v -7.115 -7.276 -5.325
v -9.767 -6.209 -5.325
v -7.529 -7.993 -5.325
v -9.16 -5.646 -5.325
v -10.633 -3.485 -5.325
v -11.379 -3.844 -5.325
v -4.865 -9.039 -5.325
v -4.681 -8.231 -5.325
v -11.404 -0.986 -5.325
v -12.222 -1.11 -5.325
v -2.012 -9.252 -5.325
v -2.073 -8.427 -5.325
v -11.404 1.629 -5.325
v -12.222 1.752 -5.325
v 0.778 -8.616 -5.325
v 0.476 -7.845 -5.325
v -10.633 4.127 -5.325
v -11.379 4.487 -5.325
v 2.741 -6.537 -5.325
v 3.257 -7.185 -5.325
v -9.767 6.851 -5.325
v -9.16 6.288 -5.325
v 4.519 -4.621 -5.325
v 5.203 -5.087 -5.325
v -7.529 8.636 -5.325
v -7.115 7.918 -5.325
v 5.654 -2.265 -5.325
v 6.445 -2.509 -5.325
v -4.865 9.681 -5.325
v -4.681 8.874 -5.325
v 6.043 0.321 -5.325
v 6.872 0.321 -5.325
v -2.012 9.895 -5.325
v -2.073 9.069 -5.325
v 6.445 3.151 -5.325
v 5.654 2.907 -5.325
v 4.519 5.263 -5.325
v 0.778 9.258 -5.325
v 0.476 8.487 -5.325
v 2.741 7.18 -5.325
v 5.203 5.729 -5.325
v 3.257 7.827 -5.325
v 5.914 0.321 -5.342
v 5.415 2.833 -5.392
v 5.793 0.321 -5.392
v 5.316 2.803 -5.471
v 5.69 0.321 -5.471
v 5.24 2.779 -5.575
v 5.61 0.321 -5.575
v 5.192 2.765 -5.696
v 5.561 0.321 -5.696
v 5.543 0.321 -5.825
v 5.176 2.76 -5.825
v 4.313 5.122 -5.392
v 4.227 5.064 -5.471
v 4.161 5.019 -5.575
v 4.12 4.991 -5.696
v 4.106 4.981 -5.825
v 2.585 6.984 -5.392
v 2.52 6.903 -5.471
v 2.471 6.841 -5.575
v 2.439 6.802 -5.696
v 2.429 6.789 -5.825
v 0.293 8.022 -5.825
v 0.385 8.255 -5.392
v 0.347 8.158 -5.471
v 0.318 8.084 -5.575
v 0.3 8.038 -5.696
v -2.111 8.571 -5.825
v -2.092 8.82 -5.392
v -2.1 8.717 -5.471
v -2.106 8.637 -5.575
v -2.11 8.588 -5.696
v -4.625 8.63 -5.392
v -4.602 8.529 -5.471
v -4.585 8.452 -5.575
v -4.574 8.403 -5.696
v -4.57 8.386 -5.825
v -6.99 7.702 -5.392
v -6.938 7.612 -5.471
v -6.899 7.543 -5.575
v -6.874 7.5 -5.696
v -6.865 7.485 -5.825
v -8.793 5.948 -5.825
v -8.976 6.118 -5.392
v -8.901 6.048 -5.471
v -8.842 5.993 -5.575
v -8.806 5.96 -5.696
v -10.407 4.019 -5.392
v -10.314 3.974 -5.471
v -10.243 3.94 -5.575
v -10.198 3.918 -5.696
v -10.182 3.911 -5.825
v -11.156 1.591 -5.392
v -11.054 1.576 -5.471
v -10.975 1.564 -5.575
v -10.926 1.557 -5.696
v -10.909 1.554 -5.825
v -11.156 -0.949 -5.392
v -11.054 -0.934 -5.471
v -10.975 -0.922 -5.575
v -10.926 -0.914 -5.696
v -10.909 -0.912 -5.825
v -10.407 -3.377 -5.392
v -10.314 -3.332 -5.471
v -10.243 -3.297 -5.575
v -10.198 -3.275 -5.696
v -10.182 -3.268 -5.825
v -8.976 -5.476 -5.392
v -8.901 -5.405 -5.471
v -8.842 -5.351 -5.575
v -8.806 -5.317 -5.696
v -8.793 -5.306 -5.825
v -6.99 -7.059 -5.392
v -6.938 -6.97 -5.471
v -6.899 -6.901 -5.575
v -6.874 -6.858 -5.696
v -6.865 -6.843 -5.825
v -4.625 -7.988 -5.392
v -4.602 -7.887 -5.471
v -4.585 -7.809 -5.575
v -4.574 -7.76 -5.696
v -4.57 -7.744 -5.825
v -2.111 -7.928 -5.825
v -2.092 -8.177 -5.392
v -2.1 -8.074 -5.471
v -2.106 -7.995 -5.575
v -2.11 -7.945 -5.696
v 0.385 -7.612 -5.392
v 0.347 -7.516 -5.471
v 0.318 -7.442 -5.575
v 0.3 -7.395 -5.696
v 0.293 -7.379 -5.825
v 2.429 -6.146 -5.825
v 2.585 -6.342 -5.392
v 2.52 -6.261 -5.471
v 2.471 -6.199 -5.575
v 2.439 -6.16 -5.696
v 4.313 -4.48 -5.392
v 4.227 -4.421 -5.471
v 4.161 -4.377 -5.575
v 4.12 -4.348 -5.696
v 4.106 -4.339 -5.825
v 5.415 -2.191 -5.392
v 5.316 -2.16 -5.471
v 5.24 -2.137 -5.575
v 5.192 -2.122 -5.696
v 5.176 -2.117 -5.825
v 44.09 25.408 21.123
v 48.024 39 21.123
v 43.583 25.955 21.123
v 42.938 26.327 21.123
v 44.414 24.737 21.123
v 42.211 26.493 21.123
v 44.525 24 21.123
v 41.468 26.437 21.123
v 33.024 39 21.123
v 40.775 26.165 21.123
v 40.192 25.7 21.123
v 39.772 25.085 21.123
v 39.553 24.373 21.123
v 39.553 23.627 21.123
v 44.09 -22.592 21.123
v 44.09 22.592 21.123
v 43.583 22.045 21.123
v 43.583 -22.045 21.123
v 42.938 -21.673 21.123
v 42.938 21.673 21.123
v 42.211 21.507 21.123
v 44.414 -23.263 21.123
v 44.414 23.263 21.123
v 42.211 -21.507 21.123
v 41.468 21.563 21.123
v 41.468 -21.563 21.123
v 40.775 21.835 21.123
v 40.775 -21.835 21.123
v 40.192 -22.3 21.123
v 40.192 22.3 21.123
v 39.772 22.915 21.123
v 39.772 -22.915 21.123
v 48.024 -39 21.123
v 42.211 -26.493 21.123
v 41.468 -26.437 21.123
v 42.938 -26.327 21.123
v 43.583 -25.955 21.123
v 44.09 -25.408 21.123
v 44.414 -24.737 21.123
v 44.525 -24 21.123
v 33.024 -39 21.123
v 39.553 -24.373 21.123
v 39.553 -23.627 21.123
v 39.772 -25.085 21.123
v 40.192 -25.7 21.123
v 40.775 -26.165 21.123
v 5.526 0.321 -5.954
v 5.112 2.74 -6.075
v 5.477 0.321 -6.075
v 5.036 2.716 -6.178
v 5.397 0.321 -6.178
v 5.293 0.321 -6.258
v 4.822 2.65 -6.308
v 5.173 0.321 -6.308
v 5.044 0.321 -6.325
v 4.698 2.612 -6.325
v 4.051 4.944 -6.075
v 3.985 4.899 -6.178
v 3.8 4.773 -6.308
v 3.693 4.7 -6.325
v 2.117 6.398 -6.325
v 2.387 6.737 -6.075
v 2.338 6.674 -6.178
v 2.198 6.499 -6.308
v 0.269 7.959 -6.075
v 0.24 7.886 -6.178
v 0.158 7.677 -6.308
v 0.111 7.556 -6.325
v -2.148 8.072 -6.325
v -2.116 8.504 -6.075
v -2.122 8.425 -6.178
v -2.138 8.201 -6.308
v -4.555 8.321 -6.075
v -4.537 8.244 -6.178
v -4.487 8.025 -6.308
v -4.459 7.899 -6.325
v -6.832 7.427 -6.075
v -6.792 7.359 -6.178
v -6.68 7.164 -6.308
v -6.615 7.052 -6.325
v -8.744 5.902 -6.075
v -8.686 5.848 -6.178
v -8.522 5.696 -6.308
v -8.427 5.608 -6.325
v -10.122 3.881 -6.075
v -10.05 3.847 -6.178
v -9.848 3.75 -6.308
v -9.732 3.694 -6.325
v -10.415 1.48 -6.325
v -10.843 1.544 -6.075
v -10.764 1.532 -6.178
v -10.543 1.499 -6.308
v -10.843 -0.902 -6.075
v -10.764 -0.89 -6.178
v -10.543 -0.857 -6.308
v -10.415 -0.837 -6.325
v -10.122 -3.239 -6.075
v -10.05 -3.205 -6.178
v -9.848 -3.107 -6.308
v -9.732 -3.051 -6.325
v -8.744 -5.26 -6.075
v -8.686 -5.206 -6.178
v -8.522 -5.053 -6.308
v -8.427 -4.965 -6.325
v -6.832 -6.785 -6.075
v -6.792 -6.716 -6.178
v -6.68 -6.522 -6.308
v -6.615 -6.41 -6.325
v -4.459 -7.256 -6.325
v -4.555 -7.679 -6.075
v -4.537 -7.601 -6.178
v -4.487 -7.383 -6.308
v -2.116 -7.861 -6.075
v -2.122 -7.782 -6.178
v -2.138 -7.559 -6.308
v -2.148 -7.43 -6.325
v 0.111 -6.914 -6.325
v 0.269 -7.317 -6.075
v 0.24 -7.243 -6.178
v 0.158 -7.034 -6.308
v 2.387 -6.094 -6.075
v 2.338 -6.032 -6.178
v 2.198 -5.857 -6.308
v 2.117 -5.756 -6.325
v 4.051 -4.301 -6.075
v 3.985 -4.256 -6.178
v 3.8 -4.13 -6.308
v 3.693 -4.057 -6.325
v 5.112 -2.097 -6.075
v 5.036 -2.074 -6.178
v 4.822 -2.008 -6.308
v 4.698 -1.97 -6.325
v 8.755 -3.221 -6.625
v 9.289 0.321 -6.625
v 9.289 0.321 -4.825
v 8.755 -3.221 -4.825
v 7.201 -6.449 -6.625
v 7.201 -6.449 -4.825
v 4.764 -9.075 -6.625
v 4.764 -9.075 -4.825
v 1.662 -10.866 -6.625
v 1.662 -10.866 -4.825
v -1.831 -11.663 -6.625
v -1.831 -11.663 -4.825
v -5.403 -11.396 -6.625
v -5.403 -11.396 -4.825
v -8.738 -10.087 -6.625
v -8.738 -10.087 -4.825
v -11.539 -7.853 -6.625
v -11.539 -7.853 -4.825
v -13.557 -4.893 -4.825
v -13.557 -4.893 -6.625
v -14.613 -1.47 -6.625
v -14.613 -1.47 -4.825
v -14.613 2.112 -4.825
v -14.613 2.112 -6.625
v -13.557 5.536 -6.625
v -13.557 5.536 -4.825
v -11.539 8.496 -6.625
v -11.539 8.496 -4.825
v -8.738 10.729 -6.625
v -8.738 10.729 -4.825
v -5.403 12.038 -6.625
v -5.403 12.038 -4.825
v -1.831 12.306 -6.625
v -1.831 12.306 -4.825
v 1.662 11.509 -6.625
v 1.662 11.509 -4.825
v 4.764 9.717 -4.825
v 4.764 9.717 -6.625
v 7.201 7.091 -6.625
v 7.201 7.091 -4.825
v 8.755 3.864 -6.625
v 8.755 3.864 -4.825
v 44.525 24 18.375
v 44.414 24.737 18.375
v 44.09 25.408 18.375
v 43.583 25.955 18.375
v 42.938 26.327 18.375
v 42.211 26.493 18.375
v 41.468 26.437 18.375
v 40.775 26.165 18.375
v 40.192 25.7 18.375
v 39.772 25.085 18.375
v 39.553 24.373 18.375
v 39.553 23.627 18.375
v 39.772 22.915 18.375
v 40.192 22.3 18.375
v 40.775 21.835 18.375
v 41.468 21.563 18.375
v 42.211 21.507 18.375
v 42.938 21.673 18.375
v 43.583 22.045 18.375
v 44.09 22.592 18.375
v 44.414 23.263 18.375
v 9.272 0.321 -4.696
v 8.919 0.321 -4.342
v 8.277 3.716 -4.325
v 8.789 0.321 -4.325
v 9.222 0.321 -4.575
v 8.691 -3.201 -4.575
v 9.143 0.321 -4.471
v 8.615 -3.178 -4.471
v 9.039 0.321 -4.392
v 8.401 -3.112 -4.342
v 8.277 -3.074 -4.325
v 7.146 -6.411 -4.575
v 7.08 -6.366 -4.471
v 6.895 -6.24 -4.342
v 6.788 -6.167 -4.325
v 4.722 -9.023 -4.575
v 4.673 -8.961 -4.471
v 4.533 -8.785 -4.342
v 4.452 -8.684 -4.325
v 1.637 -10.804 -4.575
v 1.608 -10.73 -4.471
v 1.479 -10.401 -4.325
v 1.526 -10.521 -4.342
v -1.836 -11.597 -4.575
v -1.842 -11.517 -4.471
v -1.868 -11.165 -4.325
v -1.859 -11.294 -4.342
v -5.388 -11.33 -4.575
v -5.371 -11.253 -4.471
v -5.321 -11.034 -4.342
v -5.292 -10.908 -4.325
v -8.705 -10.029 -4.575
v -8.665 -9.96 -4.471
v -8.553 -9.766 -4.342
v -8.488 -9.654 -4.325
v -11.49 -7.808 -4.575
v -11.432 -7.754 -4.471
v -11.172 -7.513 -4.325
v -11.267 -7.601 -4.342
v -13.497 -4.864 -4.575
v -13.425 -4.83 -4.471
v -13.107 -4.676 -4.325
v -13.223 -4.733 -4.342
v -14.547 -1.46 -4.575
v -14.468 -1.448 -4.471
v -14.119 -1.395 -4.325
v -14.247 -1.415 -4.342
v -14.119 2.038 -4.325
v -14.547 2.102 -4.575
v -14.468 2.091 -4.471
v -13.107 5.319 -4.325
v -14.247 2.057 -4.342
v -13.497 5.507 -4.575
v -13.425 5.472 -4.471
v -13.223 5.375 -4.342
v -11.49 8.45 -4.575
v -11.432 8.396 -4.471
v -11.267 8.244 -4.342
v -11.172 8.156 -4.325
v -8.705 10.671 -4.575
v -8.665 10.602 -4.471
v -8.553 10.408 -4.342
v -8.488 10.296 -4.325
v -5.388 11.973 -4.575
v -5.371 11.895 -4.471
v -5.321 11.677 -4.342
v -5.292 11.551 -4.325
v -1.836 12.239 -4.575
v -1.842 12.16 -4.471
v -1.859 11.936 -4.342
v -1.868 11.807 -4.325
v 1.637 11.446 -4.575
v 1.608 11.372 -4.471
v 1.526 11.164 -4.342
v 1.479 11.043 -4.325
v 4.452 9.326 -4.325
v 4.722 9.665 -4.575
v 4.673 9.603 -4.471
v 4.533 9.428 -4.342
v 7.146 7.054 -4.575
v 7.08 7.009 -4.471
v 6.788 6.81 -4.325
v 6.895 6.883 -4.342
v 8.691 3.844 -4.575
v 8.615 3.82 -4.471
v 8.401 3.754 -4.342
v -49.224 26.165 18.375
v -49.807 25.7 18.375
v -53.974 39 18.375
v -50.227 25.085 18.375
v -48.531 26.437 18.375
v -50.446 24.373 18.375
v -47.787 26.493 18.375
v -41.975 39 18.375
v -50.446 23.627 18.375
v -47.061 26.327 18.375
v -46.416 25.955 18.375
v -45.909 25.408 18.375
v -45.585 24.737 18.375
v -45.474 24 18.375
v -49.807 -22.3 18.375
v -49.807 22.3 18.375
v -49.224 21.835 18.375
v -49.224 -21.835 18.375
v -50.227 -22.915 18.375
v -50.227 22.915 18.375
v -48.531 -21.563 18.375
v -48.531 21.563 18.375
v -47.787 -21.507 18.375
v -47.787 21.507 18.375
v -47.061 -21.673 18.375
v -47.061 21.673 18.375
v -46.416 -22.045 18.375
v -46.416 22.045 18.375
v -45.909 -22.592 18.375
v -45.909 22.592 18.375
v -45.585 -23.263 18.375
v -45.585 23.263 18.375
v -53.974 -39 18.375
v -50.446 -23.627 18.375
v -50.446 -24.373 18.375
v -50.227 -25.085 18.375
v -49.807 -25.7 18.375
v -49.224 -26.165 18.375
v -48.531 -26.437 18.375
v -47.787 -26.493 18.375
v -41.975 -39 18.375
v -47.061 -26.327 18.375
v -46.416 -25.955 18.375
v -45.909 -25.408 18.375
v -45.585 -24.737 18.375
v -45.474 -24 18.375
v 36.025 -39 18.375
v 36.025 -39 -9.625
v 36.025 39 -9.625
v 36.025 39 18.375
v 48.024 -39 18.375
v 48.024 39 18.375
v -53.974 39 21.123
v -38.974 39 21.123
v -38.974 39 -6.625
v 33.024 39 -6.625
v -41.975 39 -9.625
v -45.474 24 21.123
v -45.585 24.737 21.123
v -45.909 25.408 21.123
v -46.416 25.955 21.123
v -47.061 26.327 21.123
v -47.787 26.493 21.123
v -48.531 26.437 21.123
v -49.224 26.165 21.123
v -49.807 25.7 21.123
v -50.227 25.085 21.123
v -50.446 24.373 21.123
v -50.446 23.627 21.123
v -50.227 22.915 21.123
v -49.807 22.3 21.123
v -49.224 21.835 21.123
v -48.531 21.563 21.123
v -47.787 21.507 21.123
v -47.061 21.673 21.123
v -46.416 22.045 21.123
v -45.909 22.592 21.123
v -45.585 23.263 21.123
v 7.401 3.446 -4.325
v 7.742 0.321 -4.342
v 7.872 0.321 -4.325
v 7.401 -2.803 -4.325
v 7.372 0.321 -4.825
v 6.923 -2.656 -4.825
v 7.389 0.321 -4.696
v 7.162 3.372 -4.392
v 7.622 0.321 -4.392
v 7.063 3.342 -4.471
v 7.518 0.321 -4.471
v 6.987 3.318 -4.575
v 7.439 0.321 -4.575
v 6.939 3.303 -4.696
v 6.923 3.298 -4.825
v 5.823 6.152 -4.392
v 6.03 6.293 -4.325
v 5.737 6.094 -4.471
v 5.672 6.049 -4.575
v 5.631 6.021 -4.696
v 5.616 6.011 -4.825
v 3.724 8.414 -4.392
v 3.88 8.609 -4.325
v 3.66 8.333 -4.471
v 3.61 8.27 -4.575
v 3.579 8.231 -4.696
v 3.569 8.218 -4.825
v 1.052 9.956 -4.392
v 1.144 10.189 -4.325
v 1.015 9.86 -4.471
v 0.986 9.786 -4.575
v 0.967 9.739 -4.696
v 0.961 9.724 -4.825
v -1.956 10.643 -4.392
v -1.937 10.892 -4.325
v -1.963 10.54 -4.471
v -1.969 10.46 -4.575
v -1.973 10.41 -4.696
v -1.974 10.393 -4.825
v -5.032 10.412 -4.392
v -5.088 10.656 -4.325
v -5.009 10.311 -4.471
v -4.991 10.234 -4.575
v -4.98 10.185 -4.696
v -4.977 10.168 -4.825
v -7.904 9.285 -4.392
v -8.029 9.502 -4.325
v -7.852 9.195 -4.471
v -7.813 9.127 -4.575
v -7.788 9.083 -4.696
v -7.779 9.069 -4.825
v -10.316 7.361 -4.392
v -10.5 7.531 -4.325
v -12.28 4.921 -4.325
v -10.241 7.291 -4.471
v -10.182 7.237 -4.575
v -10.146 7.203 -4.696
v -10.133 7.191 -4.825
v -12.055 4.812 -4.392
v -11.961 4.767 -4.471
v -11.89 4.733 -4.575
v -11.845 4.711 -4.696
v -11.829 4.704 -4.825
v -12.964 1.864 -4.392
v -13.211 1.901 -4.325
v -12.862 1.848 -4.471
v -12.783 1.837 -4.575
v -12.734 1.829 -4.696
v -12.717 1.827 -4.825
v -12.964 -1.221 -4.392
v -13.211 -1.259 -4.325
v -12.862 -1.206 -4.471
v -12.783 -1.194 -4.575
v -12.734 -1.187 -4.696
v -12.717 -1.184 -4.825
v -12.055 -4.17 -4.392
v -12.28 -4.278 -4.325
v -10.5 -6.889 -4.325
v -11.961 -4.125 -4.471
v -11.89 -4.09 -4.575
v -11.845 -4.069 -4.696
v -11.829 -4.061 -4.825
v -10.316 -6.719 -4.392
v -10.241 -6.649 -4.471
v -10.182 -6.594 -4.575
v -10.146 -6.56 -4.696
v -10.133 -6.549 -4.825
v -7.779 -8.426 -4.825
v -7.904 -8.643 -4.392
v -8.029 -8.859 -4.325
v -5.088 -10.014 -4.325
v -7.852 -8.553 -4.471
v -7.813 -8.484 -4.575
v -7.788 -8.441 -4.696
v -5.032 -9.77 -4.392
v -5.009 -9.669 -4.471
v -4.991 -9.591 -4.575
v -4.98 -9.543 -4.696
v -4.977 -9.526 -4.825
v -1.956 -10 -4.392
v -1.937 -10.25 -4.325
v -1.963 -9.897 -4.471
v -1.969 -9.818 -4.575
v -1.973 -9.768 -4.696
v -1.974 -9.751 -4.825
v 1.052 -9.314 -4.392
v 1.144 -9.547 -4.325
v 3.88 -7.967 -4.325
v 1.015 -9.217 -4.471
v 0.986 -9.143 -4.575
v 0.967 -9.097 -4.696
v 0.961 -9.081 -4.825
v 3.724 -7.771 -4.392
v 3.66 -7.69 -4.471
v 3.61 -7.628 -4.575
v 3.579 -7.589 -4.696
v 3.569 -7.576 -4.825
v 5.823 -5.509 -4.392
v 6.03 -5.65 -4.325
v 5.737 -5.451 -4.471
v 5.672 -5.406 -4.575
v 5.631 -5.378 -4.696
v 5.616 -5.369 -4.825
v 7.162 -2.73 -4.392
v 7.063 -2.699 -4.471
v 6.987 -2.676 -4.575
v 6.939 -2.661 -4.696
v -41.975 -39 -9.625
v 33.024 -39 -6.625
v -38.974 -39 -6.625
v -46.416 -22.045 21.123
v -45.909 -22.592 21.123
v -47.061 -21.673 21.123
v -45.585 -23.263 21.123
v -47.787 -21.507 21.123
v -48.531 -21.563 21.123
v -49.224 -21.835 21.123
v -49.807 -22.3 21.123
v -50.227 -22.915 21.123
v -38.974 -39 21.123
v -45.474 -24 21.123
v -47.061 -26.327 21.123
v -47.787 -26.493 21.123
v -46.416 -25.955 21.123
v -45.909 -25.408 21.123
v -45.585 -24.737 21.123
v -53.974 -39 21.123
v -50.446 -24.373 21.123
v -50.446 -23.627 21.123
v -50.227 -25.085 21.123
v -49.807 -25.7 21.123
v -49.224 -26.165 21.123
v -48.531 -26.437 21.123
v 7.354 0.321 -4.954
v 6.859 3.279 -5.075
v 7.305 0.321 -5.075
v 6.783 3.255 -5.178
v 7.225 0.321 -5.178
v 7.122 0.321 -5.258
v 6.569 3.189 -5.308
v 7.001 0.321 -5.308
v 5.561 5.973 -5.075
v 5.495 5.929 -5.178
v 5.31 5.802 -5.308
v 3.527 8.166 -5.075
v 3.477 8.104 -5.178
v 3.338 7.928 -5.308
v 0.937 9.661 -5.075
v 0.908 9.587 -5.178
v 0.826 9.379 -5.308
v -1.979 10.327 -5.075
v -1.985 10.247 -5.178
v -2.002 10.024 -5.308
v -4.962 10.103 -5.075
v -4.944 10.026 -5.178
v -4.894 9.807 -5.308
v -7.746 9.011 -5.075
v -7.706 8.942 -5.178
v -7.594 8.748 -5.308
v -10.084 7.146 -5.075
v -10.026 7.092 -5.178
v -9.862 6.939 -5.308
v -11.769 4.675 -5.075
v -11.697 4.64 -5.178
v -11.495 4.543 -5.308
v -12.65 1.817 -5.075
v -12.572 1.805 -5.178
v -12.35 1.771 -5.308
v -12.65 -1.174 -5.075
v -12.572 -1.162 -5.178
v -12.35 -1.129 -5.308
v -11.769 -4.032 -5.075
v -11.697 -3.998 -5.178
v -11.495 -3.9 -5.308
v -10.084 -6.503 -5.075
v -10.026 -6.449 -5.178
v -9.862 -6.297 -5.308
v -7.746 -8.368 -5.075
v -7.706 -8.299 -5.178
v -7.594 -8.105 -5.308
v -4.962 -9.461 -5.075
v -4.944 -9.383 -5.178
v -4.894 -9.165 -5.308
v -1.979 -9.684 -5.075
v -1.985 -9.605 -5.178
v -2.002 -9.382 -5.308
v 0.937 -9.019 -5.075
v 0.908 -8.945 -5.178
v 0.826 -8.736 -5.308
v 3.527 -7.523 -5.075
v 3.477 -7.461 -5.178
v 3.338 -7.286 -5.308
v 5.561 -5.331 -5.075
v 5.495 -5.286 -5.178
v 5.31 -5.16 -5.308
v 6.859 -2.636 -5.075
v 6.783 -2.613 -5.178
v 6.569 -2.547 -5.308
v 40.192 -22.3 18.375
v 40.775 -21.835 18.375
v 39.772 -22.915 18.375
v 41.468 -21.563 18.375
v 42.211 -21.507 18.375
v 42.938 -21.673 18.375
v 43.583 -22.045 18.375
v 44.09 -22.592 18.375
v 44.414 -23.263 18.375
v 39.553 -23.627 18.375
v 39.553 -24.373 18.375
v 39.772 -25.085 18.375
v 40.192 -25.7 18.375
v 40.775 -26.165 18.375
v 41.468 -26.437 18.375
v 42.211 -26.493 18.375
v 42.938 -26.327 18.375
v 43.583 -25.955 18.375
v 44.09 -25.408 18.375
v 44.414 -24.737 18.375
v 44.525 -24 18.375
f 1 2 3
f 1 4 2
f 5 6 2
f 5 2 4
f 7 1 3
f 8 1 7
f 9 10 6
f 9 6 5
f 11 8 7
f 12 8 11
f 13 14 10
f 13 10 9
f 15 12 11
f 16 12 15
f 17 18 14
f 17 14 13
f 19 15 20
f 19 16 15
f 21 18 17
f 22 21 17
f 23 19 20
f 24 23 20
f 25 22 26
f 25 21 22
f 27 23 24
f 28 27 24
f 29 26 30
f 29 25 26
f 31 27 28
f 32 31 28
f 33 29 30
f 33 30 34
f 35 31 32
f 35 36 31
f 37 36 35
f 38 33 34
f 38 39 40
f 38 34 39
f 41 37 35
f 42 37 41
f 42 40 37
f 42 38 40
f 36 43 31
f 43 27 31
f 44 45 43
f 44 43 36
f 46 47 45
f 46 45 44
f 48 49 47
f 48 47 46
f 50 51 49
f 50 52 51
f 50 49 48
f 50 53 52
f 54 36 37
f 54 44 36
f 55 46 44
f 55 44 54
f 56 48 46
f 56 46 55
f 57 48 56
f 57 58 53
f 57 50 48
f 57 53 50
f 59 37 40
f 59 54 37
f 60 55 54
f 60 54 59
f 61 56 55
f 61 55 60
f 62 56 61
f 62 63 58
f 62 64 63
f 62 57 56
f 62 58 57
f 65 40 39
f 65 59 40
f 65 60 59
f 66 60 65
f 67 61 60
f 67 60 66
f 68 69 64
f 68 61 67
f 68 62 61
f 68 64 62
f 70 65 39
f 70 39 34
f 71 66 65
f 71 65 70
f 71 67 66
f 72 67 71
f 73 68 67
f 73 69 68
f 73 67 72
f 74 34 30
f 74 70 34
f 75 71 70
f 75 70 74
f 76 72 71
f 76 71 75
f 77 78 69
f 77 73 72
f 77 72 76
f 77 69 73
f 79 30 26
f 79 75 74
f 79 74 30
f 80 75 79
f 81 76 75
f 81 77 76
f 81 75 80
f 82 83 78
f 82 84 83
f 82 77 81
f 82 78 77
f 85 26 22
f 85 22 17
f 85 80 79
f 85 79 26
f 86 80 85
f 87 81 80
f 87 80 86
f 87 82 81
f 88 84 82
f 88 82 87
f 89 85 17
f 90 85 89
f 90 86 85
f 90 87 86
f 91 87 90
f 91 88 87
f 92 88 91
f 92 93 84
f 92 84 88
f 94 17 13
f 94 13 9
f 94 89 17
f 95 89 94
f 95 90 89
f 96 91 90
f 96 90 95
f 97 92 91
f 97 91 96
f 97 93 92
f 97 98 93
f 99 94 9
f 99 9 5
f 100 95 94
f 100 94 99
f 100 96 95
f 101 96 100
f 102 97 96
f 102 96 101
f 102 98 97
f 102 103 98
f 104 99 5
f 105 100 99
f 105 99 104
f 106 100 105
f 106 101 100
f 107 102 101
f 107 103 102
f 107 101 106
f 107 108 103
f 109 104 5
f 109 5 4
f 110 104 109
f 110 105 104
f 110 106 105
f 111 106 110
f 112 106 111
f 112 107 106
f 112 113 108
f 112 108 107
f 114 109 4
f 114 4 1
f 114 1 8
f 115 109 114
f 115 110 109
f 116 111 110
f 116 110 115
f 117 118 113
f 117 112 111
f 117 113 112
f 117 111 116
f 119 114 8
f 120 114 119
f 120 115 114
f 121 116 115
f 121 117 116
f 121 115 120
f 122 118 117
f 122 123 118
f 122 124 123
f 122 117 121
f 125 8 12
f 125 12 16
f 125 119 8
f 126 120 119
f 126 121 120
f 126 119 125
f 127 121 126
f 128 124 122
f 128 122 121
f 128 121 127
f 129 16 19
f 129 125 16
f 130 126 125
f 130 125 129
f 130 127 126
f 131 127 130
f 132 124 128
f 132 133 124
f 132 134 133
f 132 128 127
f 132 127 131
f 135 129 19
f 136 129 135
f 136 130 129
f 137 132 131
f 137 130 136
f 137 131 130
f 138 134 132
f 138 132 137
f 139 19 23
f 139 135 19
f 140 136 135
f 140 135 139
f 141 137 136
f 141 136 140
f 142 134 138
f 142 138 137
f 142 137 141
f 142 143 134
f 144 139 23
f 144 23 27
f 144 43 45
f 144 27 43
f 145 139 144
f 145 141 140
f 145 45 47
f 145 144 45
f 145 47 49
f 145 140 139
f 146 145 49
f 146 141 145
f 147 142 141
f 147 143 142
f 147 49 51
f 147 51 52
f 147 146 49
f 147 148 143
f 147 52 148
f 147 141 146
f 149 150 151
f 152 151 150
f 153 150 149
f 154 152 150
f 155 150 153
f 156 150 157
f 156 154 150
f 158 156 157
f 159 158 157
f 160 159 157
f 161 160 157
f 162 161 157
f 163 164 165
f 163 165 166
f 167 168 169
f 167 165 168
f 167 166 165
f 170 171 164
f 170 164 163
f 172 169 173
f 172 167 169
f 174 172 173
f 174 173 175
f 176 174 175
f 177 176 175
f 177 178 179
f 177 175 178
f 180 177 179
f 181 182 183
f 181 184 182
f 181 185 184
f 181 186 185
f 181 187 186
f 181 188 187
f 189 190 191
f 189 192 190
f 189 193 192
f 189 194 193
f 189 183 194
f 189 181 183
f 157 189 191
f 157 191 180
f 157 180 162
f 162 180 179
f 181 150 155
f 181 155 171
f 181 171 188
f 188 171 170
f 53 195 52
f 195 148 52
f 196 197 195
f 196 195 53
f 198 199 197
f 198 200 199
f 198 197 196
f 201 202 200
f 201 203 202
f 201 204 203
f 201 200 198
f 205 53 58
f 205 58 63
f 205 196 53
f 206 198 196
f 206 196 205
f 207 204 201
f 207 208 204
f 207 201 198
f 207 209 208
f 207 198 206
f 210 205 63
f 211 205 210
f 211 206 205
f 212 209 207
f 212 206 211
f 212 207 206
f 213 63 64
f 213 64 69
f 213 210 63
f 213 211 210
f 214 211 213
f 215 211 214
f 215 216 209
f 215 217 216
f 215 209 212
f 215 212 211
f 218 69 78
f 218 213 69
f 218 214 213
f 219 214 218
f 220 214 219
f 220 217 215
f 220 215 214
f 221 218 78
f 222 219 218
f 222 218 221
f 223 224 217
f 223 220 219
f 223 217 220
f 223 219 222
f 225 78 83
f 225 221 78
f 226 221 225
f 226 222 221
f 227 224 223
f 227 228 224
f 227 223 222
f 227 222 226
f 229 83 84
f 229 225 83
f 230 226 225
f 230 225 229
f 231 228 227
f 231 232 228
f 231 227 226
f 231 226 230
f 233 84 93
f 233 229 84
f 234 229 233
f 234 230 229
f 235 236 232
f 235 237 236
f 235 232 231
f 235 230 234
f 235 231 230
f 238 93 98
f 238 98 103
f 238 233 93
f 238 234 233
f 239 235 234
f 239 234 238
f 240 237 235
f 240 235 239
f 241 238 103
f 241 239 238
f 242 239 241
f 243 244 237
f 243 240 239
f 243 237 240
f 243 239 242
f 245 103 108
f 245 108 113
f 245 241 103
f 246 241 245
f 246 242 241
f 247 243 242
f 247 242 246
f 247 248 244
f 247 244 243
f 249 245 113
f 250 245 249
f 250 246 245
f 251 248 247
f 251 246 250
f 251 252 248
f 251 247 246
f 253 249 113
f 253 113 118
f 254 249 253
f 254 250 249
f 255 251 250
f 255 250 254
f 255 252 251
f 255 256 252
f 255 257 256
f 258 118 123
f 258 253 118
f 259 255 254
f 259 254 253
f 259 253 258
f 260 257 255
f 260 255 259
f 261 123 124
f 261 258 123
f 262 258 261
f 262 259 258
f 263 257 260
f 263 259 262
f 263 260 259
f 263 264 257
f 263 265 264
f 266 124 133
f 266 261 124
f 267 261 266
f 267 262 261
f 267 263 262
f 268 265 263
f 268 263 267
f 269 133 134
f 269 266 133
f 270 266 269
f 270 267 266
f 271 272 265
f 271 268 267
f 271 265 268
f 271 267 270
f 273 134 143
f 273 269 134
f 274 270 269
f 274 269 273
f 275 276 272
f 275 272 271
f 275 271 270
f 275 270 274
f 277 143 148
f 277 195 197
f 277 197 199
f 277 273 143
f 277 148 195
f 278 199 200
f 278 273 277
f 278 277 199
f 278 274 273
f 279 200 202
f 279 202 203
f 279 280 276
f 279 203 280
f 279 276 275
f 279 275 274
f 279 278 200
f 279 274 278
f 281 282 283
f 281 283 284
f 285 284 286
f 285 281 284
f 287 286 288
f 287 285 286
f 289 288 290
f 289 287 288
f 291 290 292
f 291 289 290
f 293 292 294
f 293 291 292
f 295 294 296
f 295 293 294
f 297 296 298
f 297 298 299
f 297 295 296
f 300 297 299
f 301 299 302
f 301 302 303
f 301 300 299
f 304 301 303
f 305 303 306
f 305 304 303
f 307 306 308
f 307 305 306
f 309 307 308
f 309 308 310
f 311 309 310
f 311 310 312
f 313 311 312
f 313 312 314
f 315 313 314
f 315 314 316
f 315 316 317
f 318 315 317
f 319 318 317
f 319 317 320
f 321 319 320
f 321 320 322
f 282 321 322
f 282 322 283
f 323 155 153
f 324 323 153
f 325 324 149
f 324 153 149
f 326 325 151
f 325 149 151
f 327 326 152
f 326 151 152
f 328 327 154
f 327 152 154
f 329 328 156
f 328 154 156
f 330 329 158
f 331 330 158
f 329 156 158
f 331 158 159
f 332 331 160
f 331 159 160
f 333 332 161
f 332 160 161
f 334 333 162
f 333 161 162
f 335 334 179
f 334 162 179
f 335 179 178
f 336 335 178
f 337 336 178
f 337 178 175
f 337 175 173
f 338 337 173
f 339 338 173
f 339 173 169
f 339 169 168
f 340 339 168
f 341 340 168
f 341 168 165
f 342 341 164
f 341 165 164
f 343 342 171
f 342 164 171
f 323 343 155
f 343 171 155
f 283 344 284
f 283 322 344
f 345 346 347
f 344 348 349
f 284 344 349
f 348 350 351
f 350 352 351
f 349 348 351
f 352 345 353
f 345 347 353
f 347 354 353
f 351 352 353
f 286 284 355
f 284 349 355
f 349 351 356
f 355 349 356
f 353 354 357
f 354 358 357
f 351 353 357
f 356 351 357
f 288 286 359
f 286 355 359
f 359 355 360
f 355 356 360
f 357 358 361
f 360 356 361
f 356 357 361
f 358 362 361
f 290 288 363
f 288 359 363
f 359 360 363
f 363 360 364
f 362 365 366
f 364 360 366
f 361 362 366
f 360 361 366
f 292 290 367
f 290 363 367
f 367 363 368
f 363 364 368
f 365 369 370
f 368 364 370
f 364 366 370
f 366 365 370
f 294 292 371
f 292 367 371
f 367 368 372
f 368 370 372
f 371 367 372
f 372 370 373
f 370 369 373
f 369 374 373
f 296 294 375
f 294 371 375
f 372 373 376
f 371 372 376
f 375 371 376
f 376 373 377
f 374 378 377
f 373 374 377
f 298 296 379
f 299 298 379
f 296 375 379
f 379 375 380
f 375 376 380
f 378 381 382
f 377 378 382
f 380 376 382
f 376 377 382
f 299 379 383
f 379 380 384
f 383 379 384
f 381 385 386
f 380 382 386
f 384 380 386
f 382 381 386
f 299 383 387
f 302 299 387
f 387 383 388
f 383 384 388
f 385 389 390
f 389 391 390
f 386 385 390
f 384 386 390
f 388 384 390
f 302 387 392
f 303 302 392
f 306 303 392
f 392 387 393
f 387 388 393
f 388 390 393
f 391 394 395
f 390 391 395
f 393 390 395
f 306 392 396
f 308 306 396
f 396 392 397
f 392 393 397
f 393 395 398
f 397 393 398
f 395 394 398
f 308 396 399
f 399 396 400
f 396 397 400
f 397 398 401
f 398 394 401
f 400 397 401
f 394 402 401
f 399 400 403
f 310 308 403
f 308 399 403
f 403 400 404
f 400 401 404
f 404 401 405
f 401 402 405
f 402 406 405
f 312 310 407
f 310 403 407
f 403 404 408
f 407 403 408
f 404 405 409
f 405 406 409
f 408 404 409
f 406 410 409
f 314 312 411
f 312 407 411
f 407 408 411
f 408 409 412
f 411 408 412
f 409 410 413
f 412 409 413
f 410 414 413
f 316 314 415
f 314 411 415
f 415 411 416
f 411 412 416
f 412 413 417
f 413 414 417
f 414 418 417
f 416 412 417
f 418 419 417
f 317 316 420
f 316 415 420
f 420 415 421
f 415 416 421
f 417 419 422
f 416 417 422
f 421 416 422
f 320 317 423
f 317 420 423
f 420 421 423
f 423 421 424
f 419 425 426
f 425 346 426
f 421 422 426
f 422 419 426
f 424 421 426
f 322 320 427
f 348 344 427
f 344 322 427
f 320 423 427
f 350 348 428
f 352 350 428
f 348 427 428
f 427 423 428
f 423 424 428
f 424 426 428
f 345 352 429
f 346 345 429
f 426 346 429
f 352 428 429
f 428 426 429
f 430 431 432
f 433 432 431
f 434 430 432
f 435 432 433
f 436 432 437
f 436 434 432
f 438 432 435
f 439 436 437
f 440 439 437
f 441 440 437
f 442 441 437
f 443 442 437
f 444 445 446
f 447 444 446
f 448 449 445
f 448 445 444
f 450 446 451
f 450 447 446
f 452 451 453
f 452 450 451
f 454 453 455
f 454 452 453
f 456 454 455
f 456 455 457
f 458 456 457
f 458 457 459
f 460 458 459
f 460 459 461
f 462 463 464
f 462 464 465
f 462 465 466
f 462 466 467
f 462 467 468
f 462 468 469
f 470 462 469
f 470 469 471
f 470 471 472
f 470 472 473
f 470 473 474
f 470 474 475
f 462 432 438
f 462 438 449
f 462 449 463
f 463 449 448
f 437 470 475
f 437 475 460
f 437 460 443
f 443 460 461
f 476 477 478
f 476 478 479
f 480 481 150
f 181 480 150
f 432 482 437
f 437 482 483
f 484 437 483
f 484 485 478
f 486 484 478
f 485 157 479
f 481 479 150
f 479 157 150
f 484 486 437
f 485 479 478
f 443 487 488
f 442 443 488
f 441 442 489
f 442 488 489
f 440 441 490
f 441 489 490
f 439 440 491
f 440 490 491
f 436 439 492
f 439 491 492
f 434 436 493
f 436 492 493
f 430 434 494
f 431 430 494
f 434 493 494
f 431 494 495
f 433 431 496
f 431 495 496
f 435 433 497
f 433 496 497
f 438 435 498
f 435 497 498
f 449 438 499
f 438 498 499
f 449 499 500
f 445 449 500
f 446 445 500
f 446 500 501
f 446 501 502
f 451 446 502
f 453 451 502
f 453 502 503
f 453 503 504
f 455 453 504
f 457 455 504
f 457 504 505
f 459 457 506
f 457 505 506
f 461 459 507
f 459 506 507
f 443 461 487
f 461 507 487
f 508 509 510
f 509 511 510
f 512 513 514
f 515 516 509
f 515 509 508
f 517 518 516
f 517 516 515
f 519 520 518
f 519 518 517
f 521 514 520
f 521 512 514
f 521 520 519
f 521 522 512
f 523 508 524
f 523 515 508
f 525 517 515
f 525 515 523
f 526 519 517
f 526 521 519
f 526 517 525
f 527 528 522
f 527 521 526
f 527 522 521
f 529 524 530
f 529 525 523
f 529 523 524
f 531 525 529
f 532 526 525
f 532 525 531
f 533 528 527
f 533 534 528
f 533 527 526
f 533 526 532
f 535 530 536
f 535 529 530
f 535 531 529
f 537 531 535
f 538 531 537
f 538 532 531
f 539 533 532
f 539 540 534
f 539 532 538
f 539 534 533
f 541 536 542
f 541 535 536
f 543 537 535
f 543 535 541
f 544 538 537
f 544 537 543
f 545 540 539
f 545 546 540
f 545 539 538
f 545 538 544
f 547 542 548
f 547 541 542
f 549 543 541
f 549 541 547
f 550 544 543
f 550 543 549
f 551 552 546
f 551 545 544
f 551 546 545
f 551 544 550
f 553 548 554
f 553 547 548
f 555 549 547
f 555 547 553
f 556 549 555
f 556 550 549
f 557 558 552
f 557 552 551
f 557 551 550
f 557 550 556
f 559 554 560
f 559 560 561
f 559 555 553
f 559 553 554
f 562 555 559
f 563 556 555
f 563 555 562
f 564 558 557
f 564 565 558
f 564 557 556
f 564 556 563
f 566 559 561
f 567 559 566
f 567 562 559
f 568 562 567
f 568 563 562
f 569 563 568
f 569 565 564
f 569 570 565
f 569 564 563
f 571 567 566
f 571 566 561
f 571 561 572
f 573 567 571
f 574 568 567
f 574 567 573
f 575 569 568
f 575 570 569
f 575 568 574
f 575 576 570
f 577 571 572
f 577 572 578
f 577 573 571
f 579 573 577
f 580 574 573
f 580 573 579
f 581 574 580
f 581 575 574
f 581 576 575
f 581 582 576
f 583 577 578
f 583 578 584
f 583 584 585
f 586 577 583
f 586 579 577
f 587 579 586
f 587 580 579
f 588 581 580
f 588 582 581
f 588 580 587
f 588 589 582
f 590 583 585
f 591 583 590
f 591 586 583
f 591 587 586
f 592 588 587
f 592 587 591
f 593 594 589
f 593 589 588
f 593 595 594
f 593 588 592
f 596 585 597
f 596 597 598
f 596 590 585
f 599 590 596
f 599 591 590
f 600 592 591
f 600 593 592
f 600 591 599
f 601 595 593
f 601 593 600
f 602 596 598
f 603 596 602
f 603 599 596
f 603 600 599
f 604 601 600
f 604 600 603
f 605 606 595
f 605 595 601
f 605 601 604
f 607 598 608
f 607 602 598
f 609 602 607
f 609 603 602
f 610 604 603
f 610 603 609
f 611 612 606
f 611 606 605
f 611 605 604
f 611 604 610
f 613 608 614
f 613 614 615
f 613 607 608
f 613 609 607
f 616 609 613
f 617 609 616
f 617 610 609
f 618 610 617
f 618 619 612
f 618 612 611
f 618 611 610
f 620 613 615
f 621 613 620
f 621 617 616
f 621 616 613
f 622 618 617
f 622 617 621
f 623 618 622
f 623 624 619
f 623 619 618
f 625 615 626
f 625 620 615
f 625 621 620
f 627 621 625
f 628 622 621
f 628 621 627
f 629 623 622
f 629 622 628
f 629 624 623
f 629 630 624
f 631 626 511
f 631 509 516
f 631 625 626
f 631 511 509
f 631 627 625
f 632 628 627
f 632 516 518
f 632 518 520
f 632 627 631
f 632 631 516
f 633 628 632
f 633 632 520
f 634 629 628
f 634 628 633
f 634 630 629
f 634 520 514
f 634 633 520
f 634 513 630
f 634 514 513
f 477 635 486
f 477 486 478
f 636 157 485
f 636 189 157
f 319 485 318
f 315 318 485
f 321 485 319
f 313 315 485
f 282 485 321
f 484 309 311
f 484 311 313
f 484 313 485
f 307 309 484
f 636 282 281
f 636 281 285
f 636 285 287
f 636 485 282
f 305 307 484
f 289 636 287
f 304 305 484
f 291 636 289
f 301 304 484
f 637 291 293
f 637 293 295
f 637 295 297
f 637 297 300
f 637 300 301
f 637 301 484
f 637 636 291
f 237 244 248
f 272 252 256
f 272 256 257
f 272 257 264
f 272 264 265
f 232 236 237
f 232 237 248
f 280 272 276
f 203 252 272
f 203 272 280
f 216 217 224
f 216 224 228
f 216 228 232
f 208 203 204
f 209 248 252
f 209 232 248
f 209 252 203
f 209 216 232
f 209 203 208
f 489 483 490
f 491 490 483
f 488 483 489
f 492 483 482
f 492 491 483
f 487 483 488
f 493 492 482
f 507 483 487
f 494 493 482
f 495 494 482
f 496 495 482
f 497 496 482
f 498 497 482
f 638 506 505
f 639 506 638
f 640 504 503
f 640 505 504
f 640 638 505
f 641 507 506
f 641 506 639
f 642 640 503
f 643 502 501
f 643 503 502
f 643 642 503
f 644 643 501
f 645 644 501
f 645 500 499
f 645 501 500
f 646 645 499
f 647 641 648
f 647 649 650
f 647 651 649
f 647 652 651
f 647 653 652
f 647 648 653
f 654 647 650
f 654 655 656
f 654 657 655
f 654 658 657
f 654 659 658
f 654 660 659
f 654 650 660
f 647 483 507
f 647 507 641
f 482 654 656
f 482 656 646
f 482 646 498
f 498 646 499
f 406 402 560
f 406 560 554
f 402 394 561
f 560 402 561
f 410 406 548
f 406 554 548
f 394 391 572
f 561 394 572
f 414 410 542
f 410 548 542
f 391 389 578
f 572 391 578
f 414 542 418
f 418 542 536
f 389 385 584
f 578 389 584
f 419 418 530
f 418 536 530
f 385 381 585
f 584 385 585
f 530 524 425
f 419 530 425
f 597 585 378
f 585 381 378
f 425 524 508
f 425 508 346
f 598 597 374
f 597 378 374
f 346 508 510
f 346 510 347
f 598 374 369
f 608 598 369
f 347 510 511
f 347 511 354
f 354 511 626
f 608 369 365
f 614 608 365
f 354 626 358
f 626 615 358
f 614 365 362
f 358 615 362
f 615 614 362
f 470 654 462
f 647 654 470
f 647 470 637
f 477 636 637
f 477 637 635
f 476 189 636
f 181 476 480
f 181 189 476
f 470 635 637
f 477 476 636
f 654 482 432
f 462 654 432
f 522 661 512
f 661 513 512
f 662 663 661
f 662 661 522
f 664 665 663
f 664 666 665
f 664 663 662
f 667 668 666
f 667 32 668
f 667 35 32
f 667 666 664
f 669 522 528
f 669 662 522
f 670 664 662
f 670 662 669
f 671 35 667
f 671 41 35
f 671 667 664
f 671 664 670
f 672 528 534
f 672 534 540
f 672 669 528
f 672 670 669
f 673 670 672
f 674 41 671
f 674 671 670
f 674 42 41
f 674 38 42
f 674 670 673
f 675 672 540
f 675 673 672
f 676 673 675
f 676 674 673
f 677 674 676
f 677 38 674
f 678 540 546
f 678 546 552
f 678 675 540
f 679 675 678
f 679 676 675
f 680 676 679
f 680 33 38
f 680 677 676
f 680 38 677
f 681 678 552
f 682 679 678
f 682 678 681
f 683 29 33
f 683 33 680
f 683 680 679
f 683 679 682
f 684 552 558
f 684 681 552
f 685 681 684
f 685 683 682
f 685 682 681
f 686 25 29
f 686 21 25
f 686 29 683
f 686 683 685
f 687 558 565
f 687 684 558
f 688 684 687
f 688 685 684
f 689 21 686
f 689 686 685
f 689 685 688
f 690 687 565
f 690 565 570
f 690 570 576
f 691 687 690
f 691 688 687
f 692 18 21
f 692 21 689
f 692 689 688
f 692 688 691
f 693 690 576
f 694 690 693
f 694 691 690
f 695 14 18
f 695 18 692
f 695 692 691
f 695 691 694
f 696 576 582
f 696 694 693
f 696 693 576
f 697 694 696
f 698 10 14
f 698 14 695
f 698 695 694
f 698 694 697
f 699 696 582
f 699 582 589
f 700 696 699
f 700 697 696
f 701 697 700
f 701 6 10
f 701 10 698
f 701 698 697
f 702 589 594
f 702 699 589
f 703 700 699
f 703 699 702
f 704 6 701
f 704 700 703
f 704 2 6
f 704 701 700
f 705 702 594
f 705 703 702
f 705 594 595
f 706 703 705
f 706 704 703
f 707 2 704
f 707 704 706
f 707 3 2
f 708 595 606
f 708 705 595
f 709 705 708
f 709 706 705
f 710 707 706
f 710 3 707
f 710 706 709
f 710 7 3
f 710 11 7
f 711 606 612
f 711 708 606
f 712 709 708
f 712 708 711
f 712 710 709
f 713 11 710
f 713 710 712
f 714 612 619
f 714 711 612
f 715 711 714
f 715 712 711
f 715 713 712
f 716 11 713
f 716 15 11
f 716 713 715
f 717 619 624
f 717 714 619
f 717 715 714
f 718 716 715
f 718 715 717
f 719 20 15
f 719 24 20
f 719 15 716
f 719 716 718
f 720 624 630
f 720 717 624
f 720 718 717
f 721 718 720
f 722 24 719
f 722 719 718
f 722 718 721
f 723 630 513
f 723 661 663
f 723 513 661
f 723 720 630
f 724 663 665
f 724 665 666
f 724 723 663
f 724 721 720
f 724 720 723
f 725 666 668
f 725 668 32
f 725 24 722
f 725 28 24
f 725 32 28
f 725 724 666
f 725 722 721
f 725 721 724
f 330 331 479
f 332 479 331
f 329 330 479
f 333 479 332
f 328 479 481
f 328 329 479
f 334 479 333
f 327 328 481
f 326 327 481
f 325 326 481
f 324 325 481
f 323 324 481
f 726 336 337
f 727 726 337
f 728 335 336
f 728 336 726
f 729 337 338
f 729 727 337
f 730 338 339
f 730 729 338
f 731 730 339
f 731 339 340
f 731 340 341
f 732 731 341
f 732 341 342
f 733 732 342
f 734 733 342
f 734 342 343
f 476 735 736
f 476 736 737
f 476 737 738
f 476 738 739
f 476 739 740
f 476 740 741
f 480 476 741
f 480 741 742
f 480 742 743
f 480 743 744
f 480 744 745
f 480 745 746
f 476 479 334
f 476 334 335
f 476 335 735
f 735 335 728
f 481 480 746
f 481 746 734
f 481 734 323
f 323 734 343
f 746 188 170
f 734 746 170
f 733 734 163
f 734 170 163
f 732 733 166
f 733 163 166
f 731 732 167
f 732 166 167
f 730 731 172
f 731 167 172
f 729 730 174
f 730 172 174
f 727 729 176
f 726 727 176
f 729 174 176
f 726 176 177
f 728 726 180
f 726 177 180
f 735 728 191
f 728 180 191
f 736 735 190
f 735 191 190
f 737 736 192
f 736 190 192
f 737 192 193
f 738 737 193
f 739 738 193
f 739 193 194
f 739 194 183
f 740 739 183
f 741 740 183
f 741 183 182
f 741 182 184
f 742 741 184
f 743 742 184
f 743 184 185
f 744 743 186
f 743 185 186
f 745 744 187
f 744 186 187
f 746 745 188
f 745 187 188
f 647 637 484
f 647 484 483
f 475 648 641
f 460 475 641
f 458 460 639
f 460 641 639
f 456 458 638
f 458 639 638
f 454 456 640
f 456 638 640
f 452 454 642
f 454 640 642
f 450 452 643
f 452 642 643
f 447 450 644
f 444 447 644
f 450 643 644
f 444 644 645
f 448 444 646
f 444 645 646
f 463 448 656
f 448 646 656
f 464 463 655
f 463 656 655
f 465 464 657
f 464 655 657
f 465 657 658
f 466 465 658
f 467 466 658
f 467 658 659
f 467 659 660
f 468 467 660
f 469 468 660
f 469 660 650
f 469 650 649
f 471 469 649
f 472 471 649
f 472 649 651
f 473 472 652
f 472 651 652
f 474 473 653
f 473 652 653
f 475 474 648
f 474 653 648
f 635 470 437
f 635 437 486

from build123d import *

# Parameters (mm, degrees)
F1_DEPTH = 39
F2_R     = 2.5
F3_DEPTH = 2.748386896
F4_R     = 12.0181970212
F5_DEPTH = 5.3
F6_R     = 10.1005312929
F7_DEPTH = 1
F8_R     = 8.272494484
F9_DEPTH = 1
F10_R    = 0.49999


# Not quite as in the source:
# - a fillet or chamfer is up to 0.001 mm smaller than in the source, because OpenCascade refuses the exact size


with BuildPart() as f1:
    # F0 (on Front) → F1 (new body, symmetric)
    with BuildSketch(Plane.XZ):
        Polygon((33.0240737289, -6.6249261405), (-2.9748248395, -6.6249261405), (-2.9748248395, -9.6249261405), (36.0251751605, -9.6249261405), (36.0251751605, 18.3750738595), (48.0240737289, 18.3750738595), (48.0240737289, 21.1234607555), (33.0240737289, 21.1234607555), align=None)
        Polygon((-2.9748248395, -9.6249261405), (-2.9748248395, -6.6249261405), (-38.9737234078, -6.6249261405), (-38.9737234078, 21.1234607555), (-53.9737234078, 21.1234607555), (-53.9737234078, 18.3750738595), (-41.9748248395, 18.3750738595), (-41.9748248395, -9.6249261405), align=None)
    extrude(amount=F1_DEPTH, both=True)

    # F2 (on face) → F3 (cut, through all)
    with BuildSketch(Plane.XY.offset(21.1234607555)):
        with Locations((42.0246244447, -24)):
            Circle(F2_R)
        with Locations((42.0246244447, 24)):
            Circle(F2_R)
        with Locations((-47.9742741236, 24)):
            Circle(F2_R)
        with Locations((-47.9742741236, -24)):
            Circle(F2_R)
    extrude(amount=-F3_DEPTH, mode=Mode.SUBTRACT)

    # F4 (on face) → F5 (join)
    with BuildSketch(Plane(origin=(0, 0, -9.6249261405), x_dir=(1, 0, 0), z_dir=(0, 0, -1))):
        with Locations((-2.7290005237, -0.3212007869)):
            Circle(F4_R)
    extrude(amount=-F5_DEPTH)

    # F6 (on face) → F7 (cut)
    with BuildSketch(Plane.XY.offset(-4.3249261405)):
        with Locations((-2.7290005237, 0.3212007869)):
            Circle(F6_R)
    extrude(amount=-F7_DEPTH, mode=Mode.SUBTRACT)

    # F8 (on face) → F9 (cut)
    with BuildSketch(Plane.XY.offset(-5.3249261405)):
        with Locations((-2.7290005237, 0.3212007869)):
            Circle(F8_R)
    extrude(amount=-F9_DEPTH, mode=Mode.SUBTRACT)

    # F10 (radius 0.5 in the source; OpenCascade refuses exactly that, so slightly less here)
    f10_edges = [f1.edges().sort_by_distance(p)[0] for p in [
        (-14.747198, 0.321201, -4.324926),
        (-12.829532, 0.321201, -4.324926),
        (-12.829532, 0.321201, -5.324926),
        (-11.001495, 0.321201, -5.324926),
        (-11.001495, 0.321201, -6.324926),
    ]]
    fillet(f10_edges, radius=F10_R)


solid = f1.part
